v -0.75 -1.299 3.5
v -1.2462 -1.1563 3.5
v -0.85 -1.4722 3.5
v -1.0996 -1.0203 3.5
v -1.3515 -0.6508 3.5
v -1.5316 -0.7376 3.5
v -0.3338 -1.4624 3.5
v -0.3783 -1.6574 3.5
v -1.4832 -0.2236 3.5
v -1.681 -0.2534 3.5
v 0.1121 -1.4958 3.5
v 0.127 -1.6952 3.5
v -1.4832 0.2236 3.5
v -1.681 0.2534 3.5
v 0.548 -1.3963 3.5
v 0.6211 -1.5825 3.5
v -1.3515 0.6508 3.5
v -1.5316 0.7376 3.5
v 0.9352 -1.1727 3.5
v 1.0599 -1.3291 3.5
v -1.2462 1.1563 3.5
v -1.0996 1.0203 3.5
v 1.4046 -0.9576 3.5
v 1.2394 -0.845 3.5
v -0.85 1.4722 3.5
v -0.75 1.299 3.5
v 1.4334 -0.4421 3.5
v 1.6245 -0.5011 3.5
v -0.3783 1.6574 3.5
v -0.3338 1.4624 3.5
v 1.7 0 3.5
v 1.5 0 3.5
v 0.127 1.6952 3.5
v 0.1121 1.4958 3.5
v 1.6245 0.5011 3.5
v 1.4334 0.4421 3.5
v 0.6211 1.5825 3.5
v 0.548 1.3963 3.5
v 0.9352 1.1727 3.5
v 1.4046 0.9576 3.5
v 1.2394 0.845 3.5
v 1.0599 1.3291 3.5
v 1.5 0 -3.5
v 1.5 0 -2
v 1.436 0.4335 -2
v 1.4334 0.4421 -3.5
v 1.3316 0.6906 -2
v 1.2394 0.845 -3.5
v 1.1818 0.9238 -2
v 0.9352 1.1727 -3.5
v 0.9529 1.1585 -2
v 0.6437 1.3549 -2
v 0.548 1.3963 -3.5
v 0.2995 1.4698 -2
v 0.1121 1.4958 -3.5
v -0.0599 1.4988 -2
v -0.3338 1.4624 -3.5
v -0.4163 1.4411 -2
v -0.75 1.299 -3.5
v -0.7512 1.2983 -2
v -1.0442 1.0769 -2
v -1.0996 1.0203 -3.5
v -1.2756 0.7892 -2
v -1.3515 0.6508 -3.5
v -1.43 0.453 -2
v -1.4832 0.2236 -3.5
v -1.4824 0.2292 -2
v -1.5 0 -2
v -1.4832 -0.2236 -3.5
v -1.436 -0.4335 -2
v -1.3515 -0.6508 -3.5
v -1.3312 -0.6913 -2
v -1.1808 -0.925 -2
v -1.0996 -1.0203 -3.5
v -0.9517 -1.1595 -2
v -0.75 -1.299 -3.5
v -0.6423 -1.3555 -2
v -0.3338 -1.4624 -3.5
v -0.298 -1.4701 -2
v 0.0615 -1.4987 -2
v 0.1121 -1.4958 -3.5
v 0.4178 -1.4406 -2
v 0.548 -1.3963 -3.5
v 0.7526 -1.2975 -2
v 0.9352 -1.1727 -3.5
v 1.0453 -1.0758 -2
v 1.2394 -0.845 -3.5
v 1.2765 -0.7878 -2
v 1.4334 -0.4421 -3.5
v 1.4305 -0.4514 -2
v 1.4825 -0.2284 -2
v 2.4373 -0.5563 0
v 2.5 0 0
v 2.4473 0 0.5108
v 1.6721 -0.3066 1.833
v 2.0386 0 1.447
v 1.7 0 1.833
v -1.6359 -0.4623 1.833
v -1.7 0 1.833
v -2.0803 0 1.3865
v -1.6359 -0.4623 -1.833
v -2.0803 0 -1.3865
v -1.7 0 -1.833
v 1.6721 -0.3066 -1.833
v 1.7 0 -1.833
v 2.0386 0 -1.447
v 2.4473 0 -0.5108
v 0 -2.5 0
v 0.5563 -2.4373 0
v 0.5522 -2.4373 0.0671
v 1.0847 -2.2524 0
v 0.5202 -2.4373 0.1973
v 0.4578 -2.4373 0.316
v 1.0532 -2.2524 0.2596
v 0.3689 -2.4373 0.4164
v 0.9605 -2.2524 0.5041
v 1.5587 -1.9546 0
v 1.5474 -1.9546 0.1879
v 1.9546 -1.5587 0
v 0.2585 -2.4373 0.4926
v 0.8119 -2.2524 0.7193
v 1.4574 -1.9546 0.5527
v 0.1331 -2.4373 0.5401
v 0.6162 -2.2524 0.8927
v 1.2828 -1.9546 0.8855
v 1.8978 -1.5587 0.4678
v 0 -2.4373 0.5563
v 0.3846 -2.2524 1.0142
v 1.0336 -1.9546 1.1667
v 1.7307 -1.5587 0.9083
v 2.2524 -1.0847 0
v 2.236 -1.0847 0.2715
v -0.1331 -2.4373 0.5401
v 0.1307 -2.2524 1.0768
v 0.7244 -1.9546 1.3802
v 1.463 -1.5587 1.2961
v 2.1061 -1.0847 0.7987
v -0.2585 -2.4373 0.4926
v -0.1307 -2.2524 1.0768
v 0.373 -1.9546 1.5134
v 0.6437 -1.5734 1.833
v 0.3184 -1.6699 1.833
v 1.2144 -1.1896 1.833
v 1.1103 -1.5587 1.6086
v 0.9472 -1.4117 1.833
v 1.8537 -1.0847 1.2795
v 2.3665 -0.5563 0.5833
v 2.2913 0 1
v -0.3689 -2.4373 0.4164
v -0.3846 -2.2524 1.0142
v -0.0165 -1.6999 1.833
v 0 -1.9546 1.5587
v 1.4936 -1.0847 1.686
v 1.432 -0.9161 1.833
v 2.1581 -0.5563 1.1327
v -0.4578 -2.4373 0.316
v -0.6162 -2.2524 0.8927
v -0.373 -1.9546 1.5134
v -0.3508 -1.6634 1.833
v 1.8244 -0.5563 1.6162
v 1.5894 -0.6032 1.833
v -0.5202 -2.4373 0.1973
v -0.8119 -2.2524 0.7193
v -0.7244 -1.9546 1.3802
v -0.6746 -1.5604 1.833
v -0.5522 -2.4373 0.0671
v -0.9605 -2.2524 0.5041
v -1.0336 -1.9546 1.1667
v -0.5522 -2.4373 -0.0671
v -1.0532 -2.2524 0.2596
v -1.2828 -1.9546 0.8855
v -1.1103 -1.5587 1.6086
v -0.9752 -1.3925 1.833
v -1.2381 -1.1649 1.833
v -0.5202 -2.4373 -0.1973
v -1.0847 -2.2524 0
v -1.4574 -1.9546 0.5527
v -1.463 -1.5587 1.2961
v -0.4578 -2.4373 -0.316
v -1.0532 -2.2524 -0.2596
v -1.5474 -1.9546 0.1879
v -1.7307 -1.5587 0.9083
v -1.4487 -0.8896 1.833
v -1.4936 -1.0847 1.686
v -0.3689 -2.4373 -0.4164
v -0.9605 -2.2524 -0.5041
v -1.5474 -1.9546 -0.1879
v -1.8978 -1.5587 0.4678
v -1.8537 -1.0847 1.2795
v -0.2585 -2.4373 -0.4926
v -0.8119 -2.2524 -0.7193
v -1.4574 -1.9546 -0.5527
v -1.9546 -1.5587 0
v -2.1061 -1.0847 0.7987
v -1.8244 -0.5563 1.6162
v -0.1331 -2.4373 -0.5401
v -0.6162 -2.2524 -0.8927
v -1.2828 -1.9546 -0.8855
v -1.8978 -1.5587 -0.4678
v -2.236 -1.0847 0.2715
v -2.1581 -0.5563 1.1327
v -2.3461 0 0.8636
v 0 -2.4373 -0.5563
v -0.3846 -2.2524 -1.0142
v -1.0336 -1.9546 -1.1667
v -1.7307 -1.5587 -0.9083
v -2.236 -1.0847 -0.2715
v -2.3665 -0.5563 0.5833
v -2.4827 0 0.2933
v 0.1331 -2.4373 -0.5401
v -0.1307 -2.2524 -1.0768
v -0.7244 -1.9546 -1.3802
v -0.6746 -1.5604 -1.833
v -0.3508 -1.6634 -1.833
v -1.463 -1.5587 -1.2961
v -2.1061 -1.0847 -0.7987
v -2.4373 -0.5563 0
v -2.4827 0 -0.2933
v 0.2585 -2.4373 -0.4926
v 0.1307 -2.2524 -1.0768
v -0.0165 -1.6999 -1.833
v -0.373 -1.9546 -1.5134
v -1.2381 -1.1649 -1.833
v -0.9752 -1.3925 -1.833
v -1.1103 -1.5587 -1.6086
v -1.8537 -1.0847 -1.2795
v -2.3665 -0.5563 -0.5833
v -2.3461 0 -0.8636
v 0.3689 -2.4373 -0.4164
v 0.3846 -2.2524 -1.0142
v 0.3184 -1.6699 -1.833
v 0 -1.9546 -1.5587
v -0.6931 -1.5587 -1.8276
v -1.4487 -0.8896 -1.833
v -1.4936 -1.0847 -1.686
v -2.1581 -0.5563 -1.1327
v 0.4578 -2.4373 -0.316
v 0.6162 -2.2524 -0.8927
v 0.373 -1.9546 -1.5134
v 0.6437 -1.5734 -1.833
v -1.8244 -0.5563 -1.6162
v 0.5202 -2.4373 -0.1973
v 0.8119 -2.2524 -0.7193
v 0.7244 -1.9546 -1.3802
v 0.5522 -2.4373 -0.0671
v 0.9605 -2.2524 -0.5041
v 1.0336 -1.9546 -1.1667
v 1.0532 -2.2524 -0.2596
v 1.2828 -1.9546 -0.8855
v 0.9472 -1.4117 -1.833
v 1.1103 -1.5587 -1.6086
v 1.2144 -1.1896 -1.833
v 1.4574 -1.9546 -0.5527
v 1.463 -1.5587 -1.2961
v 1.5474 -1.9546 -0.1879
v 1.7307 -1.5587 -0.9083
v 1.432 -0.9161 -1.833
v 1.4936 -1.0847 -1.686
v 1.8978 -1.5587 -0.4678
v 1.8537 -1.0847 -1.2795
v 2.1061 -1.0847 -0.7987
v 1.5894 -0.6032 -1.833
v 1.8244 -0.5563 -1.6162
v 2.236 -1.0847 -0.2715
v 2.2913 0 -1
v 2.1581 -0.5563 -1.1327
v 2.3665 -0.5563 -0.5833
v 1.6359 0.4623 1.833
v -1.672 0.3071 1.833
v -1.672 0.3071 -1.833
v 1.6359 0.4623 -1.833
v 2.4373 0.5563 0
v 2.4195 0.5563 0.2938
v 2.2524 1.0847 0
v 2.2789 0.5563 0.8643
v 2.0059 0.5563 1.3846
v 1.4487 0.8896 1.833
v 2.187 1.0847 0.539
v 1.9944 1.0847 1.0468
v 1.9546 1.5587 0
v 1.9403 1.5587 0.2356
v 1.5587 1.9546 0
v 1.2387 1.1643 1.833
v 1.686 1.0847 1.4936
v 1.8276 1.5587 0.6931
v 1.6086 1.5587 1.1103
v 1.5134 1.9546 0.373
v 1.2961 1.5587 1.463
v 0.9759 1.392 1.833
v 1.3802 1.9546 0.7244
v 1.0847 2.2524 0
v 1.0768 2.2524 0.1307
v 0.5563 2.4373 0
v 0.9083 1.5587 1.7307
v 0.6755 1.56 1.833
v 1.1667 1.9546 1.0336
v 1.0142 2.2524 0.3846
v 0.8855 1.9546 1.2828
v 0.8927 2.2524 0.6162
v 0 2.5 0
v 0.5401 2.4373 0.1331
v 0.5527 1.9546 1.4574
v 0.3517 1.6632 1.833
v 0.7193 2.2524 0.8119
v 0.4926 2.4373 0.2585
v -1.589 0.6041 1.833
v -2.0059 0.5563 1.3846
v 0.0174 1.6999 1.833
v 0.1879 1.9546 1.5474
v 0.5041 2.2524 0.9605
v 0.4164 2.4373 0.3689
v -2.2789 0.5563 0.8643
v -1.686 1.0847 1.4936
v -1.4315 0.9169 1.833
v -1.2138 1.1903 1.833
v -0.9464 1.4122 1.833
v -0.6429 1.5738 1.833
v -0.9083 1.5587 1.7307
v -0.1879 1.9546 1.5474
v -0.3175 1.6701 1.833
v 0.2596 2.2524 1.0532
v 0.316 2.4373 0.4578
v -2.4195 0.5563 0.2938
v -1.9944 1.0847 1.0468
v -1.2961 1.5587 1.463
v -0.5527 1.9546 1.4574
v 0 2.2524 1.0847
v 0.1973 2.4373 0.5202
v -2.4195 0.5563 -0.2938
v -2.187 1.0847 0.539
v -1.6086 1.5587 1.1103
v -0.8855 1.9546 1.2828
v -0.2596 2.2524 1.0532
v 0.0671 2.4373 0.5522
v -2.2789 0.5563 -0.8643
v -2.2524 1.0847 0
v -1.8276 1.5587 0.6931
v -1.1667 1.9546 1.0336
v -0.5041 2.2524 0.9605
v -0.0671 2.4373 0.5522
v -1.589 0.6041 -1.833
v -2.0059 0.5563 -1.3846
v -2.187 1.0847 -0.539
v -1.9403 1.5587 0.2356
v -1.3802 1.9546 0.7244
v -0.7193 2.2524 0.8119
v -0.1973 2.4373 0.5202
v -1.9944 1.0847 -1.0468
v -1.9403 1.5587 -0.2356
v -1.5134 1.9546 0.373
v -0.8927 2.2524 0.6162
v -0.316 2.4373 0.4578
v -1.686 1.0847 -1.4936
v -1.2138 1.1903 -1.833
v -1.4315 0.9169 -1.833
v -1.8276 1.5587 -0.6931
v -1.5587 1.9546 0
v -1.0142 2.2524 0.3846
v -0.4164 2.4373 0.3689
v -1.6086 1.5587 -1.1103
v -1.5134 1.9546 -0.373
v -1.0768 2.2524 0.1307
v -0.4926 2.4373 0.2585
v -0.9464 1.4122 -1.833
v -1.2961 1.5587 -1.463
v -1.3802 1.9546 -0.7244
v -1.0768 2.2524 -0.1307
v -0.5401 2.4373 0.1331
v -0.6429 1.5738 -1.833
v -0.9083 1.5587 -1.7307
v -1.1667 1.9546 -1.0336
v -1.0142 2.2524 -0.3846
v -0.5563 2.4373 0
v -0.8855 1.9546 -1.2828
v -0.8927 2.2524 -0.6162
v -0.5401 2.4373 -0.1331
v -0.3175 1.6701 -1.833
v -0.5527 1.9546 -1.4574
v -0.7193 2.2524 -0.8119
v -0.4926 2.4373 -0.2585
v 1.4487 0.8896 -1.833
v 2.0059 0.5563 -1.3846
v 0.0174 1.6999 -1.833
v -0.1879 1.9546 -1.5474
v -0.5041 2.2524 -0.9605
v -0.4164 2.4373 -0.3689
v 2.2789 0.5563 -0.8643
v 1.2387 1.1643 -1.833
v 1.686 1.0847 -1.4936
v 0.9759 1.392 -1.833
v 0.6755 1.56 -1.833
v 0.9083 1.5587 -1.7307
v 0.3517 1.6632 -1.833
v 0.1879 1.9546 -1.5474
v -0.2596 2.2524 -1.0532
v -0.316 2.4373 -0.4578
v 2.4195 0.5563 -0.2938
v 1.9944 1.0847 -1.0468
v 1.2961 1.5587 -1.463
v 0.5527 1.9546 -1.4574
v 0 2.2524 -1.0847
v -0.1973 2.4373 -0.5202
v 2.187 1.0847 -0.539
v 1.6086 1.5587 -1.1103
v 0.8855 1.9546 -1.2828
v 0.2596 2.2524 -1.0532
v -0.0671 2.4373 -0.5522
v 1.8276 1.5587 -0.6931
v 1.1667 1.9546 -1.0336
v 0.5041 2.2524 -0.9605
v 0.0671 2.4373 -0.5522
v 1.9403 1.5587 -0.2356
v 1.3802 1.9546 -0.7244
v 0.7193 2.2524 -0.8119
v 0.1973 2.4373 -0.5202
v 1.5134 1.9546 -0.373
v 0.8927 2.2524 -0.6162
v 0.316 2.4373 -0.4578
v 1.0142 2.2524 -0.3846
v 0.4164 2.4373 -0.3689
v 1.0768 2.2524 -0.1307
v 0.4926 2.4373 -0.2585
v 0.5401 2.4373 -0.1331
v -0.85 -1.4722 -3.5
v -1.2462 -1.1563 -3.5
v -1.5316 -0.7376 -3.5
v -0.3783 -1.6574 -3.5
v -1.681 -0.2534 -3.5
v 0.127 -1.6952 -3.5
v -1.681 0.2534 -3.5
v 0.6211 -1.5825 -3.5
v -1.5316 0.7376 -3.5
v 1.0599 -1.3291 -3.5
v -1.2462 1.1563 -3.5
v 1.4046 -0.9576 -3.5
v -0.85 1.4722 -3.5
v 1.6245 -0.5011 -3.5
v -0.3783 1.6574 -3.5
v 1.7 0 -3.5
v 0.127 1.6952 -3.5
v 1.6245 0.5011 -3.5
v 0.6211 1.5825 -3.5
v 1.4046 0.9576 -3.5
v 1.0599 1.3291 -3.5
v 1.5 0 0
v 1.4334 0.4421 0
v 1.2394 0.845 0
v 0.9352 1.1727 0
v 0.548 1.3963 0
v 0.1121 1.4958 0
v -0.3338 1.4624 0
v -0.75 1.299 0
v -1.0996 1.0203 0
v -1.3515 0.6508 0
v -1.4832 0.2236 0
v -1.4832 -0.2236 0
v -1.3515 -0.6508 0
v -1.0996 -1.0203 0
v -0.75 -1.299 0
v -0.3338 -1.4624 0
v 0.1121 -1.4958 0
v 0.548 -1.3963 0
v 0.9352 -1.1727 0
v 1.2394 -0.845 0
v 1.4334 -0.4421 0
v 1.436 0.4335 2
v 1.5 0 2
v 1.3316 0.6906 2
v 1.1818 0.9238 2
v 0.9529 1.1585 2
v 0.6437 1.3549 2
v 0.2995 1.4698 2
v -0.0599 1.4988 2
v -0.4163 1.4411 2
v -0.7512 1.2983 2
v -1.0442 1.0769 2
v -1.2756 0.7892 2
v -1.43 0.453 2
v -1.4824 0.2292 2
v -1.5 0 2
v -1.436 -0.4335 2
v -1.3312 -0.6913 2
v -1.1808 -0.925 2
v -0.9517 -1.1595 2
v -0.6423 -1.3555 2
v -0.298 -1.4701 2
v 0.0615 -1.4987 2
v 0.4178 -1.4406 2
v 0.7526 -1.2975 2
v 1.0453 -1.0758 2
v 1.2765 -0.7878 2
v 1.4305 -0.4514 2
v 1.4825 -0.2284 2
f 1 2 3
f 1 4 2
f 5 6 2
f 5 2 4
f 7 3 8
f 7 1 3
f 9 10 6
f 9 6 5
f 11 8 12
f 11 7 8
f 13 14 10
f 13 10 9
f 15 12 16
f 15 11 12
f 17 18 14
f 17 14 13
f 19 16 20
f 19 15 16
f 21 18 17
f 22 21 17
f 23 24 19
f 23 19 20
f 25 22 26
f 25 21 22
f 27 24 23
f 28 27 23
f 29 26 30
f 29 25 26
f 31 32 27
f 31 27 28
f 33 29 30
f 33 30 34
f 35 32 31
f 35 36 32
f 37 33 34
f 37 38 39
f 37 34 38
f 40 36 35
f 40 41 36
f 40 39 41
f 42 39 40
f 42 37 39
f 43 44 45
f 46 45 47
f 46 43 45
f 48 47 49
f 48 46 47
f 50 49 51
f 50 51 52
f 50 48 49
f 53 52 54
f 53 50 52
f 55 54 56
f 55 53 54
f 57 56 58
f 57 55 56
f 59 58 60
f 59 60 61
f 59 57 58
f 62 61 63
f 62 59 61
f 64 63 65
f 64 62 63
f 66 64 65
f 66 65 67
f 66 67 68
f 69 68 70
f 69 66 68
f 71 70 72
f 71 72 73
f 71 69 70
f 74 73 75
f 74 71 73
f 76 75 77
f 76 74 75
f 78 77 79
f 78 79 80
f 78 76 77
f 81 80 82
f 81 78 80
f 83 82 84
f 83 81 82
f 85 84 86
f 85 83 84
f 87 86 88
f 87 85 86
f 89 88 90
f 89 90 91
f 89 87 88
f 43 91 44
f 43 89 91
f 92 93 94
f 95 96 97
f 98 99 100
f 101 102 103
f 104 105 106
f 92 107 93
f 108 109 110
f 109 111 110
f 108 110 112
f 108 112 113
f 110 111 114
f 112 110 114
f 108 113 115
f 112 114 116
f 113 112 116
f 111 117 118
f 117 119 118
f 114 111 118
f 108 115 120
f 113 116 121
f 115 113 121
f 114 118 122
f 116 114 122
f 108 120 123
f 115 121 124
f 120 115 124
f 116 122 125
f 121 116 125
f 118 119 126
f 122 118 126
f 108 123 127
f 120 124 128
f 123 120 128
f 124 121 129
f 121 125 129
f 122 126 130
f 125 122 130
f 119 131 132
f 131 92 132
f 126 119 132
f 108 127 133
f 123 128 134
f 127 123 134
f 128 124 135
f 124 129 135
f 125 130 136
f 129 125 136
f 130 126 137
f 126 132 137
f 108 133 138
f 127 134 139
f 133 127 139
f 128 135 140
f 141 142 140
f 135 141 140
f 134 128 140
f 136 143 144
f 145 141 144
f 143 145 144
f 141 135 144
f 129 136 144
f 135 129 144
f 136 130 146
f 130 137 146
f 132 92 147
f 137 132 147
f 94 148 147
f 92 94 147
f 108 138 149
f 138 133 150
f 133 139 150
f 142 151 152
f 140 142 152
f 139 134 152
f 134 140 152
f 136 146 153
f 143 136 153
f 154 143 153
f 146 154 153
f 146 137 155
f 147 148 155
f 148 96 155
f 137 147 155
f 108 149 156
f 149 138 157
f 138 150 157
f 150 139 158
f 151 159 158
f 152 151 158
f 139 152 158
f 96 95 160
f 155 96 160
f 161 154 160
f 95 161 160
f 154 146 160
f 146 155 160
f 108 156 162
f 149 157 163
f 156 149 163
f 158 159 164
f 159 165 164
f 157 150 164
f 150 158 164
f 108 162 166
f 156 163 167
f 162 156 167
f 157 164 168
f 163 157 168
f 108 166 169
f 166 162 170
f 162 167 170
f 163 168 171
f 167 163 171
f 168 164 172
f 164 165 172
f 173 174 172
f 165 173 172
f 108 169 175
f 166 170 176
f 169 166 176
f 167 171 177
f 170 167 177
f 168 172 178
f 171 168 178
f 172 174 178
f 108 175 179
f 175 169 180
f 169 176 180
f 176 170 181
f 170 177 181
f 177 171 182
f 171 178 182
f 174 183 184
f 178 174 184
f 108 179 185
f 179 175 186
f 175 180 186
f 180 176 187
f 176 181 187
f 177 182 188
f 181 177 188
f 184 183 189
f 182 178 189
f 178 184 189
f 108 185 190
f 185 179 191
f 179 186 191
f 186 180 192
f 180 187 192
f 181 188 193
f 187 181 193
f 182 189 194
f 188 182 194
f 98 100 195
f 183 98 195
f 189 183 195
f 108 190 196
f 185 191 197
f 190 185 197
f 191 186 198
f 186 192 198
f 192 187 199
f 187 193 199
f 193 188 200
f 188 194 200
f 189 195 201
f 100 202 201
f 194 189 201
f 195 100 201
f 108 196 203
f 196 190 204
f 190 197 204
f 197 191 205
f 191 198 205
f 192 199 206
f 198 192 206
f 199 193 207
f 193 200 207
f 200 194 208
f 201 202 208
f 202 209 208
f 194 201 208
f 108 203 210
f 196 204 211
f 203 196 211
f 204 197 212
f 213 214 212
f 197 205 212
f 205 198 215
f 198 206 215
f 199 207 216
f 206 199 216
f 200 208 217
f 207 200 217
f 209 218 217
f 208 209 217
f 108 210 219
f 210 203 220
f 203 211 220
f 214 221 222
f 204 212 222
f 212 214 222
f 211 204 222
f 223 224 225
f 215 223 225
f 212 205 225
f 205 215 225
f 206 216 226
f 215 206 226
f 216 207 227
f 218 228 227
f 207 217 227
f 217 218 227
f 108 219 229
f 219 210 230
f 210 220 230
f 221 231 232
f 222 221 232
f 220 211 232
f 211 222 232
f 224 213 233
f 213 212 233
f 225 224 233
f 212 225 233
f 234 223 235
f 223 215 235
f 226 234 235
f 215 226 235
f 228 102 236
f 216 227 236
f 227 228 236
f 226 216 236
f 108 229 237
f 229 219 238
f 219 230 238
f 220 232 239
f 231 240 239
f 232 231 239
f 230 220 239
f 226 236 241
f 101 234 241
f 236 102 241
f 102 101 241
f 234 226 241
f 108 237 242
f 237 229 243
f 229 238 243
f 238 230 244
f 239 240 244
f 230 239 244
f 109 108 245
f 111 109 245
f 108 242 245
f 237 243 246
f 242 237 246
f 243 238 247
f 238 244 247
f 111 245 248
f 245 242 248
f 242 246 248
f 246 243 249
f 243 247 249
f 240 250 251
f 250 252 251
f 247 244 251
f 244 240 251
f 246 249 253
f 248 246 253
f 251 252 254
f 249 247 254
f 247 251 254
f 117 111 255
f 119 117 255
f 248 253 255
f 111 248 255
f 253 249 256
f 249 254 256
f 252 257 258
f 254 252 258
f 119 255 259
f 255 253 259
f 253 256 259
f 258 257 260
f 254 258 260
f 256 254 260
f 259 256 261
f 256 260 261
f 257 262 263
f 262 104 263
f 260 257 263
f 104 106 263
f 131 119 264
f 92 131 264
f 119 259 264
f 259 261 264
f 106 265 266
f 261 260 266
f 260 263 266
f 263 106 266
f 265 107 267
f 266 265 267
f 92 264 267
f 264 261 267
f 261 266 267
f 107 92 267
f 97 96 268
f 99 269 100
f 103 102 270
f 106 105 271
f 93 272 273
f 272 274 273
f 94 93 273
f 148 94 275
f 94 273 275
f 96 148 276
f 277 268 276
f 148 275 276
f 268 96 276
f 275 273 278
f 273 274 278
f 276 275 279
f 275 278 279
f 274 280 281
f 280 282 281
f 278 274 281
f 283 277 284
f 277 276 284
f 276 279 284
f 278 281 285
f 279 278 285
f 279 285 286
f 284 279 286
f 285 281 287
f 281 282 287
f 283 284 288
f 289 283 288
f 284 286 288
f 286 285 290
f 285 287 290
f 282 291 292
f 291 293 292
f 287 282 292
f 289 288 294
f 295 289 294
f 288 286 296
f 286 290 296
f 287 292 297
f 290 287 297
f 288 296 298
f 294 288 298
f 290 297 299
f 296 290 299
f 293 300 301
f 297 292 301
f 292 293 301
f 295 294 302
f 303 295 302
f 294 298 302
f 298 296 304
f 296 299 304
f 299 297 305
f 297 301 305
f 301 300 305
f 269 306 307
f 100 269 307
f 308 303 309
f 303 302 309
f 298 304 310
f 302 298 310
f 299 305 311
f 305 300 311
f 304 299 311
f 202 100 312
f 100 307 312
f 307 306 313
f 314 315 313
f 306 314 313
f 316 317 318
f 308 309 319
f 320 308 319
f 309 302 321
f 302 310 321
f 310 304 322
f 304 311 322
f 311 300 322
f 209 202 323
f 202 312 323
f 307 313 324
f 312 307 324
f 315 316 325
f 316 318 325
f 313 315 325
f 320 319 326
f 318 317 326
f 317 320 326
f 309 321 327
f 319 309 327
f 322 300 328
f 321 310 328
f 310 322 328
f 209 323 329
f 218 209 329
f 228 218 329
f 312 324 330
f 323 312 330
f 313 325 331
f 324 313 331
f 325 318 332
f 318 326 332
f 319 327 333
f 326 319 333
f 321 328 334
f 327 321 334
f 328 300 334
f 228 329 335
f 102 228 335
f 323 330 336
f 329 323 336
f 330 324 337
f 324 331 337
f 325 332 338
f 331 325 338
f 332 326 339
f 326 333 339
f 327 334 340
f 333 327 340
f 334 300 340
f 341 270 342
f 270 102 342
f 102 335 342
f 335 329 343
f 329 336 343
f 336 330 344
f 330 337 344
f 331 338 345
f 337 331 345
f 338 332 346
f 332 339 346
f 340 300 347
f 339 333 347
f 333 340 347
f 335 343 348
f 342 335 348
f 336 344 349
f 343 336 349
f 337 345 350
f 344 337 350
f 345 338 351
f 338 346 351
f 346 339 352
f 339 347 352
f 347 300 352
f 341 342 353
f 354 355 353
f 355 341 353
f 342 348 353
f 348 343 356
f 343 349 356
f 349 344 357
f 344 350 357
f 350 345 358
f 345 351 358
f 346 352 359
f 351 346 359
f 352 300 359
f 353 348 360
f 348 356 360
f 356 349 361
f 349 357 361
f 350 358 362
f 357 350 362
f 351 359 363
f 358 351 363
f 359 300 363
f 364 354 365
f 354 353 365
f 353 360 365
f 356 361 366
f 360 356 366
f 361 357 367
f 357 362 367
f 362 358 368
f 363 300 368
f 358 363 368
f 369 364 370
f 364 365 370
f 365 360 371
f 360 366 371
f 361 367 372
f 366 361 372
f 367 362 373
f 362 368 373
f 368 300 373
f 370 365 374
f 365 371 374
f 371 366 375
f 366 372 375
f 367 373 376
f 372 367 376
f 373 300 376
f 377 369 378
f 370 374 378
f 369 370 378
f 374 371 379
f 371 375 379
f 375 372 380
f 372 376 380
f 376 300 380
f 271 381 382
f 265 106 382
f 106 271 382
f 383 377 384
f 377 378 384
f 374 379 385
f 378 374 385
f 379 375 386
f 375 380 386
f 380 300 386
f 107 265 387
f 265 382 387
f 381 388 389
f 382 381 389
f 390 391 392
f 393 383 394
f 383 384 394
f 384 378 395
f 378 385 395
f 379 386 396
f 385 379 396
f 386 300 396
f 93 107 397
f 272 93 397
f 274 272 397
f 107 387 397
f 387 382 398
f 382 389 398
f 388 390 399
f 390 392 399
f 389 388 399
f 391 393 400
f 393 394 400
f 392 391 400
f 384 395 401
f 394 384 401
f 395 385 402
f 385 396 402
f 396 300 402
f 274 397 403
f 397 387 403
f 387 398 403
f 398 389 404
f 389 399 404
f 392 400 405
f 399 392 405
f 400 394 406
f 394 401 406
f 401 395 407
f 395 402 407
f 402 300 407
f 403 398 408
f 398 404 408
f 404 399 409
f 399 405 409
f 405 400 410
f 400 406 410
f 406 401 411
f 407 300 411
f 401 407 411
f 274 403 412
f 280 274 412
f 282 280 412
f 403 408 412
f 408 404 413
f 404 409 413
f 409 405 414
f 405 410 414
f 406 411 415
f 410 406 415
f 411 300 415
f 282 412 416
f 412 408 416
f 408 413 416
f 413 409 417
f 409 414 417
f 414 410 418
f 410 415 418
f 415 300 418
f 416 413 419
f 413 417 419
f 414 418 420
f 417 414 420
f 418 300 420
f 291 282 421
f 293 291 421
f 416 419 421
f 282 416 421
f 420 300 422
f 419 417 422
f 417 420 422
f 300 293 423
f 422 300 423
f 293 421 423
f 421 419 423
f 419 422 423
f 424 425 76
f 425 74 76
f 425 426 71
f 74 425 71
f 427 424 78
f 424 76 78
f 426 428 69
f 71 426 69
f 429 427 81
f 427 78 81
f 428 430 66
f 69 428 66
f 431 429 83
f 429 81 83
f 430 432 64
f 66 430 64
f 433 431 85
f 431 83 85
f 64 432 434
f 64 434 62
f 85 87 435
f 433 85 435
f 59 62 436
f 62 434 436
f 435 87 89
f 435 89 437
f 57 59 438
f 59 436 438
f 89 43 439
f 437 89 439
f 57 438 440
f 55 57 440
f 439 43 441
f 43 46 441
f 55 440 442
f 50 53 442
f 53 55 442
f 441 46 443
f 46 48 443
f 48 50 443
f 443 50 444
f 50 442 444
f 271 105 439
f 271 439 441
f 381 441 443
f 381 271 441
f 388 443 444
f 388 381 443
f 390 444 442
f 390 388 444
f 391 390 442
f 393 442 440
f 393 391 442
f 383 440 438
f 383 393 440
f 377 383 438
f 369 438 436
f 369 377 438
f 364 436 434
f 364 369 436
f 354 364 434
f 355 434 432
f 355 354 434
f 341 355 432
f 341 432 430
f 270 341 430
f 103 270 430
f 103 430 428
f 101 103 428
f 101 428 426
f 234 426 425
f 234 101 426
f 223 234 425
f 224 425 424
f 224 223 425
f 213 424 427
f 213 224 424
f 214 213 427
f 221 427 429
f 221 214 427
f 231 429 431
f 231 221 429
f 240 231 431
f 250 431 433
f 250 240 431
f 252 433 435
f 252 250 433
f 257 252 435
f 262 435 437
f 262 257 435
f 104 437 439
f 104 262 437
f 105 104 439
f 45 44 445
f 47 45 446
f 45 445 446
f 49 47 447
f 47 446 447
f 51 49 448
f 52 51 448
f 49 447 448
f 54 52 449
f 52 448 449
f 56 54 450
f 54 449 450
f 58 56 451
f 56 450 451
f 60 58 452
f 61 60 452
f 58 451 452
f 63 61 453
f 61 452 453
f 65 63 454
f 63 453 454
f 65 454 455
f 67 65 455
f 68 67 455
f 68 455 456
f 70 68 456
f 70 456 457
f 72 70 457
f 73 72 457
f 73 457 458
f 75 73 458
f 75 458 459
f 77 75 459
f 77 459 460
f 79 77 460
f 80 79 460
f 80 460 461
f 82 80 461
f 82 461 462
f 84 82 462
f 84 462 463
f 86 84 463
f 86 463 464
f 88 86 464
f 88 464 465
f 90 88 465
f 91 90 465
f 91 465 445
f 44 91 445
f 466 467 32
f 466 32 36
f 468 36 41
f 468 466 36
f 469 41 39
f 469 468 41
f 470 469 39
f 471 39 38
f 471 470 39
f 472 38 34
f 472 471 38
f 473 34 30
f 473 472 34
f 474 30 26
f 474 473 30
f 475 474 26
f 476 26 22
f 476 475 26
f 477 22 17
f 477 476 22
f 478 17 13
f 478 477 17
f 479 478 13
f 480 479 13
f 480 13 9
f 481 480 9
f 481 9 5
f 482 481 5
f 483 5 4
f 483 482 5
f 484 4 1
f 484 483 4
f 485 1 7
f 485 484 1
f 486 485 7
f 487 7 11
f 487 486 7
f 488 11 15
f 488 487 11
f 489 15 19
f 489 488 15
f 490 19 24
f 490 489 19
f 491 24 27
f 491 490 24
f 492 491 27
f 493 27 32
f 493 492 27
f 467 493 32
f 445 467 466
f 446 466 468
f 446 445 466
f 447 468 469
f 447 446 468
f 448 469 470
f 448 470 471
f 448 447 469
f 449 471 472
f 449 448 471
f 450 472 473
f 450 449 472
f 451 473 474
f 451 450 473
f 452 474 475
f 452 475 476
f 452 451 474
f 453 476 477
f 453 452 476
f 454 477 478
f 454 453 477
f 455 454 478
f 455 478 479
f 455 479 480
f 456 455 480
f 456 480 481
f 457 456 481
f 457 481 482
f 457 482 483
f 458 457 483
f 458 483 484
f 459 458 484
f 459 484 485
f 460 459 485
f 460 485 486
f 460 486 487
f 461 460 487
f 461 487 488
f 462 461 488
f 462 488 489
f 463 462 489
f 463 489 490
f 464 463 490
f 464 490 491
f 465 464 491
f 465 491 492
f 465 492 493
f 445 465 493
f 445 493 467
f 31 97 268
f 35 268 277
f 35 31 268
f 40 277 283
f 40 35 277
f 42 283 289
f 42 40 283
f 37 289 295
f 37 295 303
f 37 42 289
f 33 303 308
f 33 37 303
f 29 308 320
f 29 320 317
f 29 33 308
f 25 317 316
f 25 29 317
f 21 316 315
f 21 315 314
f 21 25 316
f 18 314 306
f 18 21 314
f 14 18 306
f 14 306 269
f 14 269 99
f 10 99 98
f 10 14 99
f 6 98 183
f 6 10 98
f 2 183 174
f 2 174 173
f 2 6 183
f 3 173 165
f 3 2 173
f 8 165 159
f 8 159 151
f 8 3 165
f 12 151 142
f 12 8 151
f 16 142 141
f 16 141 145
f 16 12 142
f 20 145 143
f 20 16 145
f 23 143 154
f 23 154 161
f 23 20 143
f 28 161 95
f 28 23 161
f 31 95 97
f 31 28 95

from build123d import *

# Parameters (mm, degrees)
SKETCH2_R               = 1.5
CUT_EXTRUDE1_DEPTH      = 3.5
CUT_EXTRUDE1_DEPTH_BACK = 3.5
SKETCH2_3_R             = 1.7
SKETCH2_3_R_2           = 1.5
BOSS_EXTRUDE1_DEPTH     = 3.5


with BuildPart() as part:
    # Sketch1 one side → Revolve1 (revolve)
    with BuildSketch(Plane.XY):
        with BuildLine():
            ThreePointArc((0, -2.5), (1.767766953, -1.767766953), (2.5, 0))
            ThreePointArc((2.5, 0), (1.767766953, 1.767766953), (0, 2.5))
            Line((0, 2.5), (0, -2.5))
        make_face()
    revolve(axis=Axis((0, 2.75, 0), (0, -1, 0)))

    # Sketch2 → Cut-Extrude1 (cut, two sides)
    with BuildSketch(Plane.XY) as cut_extrude1_sk:
        Circle(SKETCH2_R)
    extrude(amount=CUT_EXTRUDE1_DEPTH, mode=Mode.SUBTRACT)
    extrude(cut_extrude1_sk.sketch, amount=-CUT_EXTRUDE1_DEPTH_BACK, mode=Mode.SUBTRACT)

    # Sketch2<3> → Boss-Extrude1 (add, symmetric)
    with BuildSketch(Plane.XY):
        Circle(SKETCH2_3_R)
        Circle(SKETCH2_3_R_2, mode=Mode.SUBTRACT)
    extrude(amount=BOSS_EXTRUDE1_DEPTH, both=True)


solid = part.part
